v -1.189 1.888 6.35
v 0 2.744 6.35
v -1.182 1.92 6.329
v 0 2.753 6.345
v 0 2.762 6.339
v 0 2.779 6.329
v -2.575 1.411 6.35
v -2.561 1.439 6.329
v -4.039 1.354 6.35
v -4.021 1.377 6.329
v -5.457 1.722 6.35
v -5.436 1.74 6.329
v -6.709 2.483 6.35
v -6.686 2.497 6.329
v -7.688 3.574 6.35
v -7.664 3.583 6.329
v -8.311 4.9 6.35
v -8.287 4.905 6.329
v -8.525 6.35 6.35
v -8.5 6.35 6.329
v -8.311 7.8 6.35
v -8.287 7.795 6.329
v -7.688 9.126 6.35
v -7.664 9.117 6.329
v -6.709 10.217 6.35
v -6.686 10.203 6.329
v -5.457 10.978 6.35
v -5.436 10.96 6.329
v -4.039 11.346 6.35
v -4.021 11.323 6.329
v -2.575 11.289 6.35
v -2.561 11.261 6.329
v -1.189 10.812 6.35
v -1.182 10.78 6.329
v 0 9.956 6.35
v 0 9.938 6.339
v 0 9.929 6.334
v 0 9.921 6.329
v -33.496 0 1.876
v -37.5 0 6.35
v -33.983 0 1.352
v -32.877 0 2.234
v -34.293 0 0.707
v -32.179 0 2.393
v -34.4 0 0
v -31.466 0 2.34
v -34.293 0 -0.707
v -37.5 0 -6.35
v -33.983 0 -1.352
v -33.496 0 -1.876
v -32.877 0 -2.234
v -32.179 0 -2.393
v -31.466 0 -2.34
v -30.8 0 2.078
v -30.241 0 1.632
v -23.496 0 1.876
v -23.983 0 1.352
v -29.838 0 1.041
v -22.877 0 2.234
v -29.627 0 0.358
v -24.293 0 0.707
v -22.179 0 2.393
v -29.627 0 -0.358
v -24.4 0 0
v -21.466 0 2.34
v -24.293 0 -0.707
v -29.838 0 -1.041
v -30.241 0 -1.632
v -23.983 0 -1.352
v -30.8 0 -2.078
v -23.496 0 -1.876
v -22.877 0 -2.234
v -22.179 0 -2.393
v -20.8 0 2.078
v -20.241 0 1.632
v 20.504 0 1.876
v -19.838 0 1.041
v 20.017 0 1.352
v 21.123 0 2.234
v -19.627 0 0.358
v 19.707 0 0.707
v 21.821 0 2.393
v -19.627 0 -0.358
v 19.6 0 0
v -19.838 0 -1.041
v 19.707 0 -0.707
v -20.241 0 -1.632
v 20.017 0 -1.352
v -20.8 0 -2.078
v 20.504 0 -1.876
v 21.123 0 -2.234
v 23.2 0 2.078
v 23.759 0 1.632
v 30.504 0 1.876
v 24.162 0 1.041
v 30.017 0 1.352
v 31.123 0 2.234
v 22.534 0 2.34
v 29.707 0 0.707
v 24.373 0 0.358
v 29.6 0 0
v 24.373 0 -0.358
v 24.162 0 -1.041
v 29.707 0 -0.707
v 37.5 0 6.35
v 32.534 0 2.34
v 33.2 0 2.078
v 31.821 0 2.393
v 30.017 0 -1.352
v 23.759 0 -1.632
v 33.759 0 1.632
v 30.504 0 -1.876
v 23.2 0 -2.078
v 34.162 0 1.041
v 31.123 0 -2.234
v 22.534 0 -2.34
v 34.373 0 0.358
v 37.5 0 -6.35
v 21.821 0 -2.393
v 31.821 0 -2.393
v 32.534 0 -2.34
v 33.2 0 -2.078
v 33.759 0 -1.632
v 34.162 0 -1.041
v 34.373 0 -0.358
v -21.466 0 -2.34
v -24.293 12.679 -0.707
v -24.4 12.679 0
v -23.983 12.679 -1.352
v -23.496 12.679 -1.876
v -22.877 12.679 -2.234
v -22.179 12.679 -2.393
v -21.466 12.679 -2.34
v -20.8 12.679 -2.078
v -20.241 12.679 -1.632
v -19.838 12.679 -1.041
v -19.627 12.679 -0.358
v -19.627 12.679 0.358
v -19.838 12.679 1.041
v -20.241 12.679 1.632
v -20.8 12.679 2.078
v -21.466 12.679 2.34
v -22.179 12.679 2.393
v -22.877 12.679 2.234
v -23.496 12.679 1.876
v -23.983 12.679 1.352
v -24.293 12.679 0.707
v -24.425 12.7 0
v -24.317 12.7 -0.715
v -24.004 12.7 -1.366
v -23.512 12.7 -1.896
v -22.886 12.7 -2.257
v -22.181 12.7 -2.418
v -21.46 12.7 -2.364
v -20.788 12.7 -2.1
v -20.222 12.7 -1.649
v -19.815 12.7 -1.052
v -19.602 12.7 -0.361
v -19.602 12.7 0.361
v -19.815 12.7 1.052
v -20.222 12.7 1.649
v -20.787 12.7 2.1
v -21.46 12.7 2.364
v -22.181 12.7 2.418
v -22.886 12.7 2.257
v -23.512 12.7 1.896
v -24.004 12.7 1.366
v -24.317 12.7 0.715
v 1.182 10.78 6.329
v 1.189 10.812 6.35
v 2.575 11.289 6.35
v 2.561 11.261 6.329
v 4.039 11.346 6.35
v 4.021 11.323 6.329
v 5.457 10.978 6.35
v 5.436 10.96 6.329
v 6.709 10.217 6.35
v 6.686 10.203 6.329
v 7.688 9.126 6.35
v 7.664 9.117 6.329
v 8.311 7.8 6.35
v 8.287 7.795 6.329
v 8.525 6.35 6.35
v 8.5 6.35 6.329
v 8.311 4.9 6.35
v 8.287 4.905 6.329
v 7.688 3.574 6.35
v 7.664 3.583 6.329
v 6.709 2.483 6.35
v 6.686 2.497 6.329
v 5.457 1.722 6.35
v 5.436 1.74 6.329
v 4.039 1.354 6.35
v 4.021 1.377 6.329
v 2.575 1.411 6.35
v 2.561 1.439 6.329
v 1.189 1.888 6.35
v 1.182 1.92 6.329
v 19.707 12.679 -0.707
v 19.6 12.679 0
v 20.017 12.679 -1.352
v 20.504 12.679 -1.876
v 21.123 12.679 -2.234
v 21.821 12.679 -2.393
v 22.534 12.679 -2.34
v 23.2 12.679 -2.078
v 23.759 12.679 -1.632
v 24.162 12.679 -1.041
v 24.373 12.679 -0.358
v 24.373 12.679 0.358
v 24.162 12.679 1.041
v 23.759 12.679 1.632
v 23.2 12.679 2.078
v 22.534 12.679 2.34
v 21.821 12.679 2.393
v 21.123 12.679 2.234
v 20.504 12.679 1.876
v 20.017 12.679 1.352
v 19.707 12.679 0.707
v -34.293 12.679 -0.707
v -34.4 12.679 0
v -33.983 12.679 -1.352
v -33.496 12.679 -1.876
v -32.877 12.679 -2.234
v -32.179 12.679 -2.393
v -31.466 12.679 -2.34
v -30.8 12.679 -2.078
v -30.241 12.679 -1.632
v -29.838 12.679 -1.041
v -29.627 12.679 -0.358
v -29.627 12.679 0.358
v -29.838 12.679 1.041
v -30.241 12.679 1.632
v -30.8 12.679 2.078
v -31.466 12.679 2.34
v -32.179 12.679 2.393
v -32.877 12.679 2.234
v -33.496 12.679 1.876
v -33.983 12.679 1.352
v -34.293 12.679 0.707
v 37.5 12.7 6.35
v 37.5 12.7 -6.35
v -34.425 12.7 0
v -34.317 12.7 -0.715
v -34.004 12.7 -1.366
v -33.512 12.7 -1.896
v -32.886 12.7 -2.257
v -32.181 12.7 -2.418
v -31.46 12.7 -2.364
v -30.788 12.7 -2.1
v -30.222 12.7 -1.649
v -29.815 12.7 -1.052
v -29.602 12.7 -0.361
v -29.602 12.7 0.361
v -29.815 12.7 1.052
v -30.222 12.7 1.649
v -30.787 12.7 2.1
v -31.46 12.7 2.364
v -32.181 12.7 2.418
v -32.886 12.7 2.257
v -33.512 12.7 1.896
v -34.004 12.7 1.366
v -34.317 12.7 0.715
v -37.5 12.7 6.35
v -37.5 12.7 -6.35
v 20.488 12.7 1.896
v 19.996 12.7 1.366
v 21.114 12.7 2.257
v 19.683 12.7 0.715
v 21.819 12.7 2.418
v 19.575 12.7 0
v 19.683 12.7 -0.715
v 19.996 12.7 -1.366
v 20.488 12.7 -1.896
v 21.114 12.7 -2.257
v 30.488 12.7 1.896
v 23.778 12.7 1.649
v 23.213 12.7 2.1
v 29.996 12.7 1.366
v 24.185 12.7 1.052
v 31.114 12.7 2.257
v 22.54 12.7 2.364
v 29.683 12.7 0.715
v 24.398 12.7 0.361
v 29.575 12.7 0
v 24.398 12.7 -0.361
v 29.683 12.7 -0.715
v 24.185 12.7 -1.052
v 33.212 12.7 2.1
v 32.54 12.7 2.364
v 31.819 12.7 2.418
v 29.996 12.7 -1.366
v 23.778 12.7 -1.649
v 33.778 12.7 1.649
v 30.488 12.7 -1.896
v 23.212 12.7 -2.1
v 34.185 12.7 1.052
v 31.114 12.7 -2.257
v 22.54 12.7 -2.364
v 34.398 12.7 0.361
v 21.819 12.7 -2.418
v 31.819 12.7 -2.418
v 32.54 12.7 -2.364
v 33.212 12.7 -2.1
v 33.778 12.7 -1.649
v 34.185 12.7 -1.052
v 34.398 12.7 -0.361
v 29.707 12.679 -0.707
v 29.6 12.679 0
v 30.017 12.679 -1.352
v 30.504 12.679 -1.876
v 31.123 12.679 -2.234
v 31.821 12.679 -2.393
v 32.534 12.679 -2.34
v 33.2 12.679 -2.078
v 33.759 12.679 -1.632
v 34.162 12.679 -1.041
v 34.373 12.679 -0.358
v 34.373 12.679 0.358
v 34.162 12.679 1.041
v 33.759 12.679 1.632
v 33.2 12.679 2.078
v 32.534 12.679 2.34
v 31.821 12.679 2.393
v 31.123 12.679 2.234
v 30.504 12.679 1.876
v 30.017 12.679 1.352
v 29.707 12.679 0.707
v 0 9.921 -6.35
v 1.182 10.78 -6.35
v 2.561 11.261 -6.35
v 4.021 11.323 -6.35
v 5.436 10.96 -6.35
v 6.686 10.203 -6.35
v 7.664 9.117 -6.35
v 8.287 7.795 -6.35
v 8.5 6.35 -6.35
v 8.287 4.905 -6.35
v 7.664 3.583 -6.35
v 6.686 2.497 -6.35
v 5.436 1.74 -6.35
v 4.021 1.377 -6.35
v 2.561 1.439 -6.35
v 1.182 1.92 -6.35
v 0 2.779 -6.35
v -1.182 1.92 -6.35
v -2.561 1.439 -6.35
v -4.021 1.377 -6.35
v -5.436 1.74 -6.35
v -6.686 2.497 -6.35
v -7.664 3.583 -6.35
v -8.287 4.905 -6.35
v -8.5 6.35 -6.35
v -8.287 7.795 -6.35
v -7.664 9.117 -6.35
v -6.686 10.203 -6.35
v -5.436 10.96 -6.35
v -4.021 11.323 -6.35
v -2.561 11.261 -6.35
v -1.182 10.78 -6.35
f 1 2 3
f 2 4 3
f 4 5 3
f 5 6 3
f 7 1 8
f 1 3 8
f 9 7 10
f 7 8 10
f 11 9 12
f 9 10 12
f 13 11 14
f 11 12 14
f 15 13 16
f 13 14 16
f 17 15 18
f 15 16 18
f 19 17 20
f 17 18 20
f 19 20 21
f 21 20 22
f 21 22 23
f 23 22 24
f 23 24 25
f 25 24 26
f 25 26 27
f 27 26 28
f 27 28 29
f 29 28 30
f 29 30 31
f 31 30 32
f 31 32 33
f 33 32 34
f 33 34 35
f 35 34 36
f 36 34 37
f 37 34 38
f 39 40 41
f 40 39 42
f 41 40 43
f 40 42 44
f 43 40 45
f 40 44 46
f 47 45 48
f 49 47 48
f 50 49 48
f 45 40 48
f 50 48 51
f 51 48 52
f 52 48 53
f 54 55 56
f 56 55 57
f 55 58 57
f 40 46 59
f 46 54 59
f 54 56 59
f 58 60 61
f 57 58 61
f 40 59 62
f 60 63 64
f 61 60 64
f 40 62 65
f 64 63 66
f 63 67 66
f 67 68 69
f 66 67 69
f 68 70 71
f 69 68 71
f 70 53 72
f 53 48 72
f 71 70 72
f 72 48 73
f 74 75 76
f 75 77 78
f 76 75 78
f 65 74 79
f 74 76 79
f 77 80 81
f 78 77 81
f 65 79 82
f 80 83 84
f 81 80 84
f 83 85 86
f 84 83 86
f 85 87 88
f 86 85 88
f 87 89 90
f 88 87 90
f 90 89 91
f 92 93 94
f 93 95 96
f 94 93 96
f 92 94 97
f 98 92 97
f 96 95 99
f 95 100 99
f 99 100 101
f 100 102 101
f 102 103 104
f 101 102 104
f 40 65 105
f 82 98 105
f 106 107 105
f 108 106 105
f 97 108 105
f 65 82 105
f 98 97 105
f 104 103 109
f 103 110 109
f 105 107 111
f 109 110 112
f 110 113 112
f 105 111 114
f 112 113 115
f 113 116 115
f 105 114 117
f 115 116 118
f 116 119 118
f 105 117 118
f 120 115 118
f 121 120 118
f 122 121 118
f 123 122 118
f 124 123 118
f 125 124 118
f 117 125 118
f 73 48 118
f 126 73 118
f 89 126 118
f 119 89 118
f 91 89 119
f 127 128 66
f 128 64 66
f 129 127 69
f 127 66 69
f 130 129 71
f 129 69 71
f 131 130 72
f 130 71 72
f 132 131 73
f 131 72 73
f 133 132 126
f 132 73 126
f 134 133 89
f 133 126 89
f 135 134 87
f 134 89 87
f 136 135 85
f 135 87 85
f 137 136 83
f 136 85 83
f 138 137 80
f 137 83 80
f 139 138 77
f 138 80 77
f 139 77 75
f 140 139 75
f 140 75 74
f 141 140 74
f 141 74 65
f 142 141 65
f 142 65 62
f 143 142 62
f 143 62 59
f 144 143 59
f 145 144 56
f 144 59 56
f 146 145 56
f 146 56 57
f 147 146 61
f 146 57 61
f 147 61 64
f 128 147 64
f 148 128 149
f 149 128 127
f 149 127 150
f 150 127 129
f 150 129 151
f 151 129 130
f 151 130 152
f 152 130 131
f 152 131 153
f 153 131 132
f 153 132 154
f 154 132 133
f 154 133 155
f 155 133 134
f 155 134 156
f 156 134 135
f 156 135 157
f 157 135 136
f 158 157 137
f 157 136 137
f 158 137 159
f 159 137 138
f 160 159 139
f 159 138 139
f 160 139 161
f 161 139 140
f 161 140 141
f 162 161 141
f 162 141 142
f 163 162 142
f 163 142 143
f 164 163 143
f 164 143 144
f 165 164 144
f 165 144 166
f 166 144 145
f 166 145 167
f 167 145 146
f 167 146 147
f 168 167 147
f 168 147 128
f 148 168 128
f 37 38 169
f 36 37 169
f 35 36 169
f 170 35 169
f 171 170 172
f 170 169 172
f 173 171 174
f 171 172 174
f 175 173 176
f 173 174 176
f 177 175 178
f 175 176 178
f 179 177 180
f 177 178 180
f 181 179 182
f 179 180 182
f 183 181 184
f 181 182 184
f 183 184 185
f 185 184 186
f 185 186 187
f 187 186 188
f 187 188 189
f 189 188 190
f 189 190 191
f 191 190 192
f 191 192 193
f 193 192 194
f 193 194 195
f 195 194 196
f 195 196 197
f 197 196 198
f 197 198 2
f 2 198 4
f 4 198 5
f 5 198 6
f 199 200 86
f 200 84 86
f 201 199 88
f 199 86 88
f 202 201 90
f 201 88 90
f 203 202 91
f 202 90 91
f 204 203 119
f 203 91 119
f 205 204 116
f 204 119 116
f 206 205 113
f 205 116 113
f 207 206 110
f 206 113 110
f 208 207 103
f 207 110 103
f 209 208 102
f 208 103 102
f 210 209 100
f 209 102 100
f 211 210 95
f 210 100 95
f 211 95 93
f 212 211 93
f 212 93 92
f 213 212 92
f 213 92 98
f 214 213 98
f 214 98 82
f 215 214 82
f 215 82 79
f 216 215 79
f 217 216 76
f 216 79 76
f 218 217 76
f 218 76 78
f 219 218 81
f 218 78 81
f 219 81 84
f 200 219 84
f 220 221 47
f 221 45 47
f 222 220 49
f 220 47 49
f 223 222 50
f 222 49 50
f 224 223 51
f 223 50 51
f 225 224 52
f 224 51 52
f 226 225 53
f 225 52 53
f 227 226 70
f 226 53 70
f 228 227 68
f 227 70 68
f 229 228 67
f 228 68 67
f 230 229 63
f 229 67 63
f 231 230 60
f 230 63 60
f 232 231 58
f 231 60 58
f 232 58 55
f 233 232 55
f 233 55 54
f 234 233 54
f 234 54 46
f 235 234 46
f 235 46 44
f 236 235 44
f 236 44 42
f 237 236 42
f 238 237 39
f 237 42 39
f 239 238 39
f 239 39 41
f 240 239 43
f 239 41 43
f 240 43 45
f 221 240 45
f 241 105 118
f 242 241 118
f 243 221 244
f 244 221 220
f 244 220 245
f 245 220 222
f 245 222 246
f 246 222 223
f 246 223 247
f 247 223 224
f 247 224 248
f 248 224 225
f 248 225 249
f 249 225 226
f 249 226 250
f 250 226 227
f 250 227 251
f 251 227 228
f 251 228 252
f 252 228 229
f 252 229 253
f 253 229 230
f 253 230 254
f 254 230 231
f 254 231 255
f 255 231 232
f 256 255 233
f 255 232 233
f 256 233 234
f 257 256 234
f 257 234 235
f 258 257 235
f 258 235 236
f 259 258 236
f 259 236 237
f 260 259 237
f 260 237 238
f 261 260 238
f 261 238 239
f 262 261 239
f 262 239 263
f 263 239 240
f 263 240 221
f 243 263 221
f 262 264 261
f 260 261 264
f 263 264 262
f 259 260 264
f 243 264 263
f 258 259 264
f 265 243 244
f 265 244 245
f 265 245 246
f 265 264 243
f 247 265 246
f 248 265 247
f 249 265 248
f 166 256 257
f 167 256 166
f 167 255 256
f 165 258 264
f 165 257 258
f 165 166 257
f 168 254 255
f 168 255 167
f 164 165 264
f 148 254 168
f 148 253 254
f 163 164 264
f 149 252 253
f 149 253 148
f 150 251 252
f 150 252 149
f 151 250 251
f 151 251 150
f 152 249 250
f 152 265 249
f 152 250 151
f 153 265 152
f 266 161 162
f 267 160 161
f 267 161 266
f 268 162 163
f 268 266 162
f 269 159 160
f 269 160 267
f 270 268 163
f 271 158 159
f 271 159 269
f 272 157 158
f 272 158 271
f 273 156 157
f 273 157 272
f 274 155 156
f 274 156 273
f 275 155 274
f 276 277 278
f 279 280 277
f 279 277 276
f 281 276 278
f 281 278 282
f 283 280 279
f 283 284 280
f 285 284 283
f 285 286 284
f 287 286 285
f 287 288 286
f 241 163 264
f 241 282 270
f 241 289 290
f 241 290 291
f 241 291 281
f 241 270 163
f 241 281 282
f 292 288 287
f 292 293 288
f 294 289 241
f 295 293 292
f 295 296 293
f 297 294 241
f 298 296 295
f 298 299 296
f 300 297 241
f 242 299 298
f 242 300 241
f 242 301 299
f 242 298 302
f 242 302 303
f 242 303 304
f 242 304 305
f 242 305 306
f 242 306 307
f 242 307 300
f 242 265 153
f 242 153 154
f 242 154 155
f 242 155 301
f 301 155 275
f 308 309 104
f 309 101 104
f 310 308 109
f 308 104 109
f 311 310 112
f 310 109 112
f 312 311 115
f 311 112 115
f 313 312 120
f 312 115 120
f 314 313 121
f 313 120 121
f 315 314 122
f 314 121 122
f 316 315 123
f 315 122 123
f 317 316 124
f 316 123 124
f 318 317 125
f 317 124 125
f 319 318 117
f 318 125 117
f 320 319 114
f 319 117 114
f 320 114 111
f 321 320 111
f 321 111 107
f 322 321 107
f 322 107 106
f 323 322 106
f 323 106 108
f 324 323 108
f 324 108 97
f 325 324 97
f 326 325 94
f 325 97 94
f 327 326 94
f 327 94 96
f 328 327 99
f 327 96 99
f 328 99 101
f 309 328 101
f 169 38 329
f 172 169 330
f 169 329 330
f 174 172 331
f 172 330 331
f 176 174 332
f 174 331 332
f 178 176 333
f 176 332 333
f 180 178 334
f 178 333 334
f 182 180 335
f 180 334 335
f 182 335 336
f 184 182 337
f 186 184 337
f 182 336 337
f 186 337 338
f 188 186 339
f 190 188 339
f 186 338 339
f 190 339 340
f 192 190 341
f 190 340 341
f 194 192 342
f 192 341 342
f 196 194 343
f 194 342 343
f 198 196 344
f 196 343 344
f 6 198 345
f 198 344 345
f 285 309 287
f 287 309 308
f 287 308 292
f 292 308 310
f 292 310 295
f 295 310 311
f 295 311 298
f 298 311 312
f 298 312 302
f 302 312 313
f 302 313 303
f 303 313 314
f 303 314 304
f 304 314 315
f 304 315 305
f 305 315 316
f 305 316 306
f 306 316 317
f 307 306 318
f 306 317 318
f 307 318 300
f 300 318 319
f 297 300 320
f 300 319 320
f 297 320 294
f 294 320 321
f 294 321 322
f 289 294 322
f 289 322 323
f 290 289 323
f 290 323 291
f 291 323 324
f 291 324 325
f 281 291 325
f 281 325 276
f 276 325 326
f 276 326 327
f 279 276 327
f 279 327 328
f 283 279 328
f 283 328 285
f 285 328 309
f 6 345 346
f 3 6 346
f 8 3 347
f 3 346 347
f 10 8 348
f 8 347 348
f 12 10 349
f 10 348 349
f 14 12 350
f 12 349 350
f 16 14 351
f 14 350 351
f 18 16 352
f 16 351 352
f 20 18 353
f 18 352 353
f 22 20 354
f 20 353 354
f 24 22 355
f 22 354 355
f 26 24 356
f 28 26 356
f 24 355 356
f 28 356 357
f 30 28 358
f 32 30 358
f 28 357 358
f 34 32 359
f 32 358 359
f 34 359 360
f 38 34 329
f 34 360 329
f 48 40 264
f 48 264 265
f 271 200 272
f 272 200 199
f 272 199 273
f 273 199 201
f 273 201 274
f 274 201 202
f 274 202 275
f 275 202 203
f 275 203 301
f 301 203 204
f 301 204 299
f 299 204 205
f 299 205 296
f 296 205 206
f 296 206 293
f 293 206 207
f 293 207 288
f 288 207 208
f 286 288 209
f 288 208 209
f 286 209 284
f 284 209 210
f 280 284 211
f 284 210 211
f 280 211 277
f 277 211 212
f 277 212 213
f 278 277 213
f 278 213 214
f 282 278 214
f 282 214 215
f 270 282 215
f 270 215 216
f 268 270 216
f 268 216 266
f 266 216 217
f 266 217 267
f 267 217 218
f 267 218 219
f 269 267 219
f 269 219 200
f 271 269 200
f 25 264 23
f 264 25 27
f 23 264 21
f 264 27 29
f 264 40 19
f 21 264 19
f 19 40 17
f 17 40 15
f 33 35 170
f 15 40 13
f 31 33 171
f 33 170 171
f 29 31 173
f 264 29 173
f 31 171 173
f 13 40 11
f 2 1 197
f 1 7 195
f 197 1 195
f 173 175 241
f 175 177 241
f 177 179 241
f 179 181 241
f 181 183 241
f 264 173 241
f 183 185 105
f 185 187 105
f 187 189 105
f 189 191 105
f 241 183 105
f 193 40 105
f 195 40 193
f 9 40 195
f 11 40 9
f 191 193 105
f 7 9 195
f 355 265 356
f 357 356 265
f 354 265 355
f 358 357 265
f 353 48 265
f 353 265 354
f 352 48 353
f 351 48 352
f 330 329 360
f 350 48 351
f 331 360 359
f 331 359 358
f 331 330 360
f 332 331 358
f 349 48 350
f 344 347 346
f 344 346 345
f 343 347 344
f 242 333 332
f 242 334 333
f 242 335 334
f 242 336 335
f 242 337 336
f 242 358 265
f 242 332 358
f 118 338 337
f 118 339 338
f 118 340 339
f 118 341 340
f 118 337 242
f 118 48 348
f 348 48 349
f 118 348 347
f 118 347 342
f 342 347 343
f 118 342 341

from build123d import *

# Parameters (mm, degrees)
SKETCH1_W                      = 75
SKETCH1_H                      = 12.7
BOSS_EXTRUDE1_DEPTH            = 12.7
M4_CLEARANCE_HOLE1_D           = 4.8
M4_CLEARANCE_HOLE1_CSINK_D     = 4.85
M4_CLEARANCE_HOLE1_CSINK_ANGLE = 100
M8_CLEARANCE_HOLE1_D           = 10
M8_CLEARANCE_HOLE1_CSINK_D     = 10.05
M8_CLEARANCE_HOLE1_CSINK_ANGLE = 100


with BuildPart() as part:
    # Sketch1 → Boss-Extrude1 (new body)
    with BuildSketch(Plane(origin=(0, 0, 0), x_dir=(1, 0, 0), z_dir=(0, 1, 0))):
        Rectangle(SKETCH1_W, SKETCH1_H)
    extrude(amount=BOSS_EXTRUDE1_DEPTH)

    # M4 Clearance Hole1 (through all)
    with Locations(Plane(origin=(0, 12.7, 0), x_dir=(1, 0, 0), z_dir=(0, 1, 0))):
        with Locations((-32, 0), (-22, 0), (22, 0), (32, 0)):
            CounterSinkHole(M4_CLEARANCE_HOLE1_D / 2, M4_CLEARANCE_HOLE1_CSINK_D / 2, counter_sink_angle=M4_CLEARANCE_HOLE1_CSINK_ANGLE)

    # M8 Clearance Hole1 (through all)
    with Locations(Plane.XY.offset(6.35)):
        with Locations((-3.5, 6.35), (3.5, 6.35)):
            CounterSinkHole(M8_CLEARANCE_HOLE1_D / 2, M8_CLEARANCE_HOLE1_CSINK_D / 2, counter_sink_angle=M8_CLEARANCE_HOLE1_CSINK_ANGLE)


solid = part.part
